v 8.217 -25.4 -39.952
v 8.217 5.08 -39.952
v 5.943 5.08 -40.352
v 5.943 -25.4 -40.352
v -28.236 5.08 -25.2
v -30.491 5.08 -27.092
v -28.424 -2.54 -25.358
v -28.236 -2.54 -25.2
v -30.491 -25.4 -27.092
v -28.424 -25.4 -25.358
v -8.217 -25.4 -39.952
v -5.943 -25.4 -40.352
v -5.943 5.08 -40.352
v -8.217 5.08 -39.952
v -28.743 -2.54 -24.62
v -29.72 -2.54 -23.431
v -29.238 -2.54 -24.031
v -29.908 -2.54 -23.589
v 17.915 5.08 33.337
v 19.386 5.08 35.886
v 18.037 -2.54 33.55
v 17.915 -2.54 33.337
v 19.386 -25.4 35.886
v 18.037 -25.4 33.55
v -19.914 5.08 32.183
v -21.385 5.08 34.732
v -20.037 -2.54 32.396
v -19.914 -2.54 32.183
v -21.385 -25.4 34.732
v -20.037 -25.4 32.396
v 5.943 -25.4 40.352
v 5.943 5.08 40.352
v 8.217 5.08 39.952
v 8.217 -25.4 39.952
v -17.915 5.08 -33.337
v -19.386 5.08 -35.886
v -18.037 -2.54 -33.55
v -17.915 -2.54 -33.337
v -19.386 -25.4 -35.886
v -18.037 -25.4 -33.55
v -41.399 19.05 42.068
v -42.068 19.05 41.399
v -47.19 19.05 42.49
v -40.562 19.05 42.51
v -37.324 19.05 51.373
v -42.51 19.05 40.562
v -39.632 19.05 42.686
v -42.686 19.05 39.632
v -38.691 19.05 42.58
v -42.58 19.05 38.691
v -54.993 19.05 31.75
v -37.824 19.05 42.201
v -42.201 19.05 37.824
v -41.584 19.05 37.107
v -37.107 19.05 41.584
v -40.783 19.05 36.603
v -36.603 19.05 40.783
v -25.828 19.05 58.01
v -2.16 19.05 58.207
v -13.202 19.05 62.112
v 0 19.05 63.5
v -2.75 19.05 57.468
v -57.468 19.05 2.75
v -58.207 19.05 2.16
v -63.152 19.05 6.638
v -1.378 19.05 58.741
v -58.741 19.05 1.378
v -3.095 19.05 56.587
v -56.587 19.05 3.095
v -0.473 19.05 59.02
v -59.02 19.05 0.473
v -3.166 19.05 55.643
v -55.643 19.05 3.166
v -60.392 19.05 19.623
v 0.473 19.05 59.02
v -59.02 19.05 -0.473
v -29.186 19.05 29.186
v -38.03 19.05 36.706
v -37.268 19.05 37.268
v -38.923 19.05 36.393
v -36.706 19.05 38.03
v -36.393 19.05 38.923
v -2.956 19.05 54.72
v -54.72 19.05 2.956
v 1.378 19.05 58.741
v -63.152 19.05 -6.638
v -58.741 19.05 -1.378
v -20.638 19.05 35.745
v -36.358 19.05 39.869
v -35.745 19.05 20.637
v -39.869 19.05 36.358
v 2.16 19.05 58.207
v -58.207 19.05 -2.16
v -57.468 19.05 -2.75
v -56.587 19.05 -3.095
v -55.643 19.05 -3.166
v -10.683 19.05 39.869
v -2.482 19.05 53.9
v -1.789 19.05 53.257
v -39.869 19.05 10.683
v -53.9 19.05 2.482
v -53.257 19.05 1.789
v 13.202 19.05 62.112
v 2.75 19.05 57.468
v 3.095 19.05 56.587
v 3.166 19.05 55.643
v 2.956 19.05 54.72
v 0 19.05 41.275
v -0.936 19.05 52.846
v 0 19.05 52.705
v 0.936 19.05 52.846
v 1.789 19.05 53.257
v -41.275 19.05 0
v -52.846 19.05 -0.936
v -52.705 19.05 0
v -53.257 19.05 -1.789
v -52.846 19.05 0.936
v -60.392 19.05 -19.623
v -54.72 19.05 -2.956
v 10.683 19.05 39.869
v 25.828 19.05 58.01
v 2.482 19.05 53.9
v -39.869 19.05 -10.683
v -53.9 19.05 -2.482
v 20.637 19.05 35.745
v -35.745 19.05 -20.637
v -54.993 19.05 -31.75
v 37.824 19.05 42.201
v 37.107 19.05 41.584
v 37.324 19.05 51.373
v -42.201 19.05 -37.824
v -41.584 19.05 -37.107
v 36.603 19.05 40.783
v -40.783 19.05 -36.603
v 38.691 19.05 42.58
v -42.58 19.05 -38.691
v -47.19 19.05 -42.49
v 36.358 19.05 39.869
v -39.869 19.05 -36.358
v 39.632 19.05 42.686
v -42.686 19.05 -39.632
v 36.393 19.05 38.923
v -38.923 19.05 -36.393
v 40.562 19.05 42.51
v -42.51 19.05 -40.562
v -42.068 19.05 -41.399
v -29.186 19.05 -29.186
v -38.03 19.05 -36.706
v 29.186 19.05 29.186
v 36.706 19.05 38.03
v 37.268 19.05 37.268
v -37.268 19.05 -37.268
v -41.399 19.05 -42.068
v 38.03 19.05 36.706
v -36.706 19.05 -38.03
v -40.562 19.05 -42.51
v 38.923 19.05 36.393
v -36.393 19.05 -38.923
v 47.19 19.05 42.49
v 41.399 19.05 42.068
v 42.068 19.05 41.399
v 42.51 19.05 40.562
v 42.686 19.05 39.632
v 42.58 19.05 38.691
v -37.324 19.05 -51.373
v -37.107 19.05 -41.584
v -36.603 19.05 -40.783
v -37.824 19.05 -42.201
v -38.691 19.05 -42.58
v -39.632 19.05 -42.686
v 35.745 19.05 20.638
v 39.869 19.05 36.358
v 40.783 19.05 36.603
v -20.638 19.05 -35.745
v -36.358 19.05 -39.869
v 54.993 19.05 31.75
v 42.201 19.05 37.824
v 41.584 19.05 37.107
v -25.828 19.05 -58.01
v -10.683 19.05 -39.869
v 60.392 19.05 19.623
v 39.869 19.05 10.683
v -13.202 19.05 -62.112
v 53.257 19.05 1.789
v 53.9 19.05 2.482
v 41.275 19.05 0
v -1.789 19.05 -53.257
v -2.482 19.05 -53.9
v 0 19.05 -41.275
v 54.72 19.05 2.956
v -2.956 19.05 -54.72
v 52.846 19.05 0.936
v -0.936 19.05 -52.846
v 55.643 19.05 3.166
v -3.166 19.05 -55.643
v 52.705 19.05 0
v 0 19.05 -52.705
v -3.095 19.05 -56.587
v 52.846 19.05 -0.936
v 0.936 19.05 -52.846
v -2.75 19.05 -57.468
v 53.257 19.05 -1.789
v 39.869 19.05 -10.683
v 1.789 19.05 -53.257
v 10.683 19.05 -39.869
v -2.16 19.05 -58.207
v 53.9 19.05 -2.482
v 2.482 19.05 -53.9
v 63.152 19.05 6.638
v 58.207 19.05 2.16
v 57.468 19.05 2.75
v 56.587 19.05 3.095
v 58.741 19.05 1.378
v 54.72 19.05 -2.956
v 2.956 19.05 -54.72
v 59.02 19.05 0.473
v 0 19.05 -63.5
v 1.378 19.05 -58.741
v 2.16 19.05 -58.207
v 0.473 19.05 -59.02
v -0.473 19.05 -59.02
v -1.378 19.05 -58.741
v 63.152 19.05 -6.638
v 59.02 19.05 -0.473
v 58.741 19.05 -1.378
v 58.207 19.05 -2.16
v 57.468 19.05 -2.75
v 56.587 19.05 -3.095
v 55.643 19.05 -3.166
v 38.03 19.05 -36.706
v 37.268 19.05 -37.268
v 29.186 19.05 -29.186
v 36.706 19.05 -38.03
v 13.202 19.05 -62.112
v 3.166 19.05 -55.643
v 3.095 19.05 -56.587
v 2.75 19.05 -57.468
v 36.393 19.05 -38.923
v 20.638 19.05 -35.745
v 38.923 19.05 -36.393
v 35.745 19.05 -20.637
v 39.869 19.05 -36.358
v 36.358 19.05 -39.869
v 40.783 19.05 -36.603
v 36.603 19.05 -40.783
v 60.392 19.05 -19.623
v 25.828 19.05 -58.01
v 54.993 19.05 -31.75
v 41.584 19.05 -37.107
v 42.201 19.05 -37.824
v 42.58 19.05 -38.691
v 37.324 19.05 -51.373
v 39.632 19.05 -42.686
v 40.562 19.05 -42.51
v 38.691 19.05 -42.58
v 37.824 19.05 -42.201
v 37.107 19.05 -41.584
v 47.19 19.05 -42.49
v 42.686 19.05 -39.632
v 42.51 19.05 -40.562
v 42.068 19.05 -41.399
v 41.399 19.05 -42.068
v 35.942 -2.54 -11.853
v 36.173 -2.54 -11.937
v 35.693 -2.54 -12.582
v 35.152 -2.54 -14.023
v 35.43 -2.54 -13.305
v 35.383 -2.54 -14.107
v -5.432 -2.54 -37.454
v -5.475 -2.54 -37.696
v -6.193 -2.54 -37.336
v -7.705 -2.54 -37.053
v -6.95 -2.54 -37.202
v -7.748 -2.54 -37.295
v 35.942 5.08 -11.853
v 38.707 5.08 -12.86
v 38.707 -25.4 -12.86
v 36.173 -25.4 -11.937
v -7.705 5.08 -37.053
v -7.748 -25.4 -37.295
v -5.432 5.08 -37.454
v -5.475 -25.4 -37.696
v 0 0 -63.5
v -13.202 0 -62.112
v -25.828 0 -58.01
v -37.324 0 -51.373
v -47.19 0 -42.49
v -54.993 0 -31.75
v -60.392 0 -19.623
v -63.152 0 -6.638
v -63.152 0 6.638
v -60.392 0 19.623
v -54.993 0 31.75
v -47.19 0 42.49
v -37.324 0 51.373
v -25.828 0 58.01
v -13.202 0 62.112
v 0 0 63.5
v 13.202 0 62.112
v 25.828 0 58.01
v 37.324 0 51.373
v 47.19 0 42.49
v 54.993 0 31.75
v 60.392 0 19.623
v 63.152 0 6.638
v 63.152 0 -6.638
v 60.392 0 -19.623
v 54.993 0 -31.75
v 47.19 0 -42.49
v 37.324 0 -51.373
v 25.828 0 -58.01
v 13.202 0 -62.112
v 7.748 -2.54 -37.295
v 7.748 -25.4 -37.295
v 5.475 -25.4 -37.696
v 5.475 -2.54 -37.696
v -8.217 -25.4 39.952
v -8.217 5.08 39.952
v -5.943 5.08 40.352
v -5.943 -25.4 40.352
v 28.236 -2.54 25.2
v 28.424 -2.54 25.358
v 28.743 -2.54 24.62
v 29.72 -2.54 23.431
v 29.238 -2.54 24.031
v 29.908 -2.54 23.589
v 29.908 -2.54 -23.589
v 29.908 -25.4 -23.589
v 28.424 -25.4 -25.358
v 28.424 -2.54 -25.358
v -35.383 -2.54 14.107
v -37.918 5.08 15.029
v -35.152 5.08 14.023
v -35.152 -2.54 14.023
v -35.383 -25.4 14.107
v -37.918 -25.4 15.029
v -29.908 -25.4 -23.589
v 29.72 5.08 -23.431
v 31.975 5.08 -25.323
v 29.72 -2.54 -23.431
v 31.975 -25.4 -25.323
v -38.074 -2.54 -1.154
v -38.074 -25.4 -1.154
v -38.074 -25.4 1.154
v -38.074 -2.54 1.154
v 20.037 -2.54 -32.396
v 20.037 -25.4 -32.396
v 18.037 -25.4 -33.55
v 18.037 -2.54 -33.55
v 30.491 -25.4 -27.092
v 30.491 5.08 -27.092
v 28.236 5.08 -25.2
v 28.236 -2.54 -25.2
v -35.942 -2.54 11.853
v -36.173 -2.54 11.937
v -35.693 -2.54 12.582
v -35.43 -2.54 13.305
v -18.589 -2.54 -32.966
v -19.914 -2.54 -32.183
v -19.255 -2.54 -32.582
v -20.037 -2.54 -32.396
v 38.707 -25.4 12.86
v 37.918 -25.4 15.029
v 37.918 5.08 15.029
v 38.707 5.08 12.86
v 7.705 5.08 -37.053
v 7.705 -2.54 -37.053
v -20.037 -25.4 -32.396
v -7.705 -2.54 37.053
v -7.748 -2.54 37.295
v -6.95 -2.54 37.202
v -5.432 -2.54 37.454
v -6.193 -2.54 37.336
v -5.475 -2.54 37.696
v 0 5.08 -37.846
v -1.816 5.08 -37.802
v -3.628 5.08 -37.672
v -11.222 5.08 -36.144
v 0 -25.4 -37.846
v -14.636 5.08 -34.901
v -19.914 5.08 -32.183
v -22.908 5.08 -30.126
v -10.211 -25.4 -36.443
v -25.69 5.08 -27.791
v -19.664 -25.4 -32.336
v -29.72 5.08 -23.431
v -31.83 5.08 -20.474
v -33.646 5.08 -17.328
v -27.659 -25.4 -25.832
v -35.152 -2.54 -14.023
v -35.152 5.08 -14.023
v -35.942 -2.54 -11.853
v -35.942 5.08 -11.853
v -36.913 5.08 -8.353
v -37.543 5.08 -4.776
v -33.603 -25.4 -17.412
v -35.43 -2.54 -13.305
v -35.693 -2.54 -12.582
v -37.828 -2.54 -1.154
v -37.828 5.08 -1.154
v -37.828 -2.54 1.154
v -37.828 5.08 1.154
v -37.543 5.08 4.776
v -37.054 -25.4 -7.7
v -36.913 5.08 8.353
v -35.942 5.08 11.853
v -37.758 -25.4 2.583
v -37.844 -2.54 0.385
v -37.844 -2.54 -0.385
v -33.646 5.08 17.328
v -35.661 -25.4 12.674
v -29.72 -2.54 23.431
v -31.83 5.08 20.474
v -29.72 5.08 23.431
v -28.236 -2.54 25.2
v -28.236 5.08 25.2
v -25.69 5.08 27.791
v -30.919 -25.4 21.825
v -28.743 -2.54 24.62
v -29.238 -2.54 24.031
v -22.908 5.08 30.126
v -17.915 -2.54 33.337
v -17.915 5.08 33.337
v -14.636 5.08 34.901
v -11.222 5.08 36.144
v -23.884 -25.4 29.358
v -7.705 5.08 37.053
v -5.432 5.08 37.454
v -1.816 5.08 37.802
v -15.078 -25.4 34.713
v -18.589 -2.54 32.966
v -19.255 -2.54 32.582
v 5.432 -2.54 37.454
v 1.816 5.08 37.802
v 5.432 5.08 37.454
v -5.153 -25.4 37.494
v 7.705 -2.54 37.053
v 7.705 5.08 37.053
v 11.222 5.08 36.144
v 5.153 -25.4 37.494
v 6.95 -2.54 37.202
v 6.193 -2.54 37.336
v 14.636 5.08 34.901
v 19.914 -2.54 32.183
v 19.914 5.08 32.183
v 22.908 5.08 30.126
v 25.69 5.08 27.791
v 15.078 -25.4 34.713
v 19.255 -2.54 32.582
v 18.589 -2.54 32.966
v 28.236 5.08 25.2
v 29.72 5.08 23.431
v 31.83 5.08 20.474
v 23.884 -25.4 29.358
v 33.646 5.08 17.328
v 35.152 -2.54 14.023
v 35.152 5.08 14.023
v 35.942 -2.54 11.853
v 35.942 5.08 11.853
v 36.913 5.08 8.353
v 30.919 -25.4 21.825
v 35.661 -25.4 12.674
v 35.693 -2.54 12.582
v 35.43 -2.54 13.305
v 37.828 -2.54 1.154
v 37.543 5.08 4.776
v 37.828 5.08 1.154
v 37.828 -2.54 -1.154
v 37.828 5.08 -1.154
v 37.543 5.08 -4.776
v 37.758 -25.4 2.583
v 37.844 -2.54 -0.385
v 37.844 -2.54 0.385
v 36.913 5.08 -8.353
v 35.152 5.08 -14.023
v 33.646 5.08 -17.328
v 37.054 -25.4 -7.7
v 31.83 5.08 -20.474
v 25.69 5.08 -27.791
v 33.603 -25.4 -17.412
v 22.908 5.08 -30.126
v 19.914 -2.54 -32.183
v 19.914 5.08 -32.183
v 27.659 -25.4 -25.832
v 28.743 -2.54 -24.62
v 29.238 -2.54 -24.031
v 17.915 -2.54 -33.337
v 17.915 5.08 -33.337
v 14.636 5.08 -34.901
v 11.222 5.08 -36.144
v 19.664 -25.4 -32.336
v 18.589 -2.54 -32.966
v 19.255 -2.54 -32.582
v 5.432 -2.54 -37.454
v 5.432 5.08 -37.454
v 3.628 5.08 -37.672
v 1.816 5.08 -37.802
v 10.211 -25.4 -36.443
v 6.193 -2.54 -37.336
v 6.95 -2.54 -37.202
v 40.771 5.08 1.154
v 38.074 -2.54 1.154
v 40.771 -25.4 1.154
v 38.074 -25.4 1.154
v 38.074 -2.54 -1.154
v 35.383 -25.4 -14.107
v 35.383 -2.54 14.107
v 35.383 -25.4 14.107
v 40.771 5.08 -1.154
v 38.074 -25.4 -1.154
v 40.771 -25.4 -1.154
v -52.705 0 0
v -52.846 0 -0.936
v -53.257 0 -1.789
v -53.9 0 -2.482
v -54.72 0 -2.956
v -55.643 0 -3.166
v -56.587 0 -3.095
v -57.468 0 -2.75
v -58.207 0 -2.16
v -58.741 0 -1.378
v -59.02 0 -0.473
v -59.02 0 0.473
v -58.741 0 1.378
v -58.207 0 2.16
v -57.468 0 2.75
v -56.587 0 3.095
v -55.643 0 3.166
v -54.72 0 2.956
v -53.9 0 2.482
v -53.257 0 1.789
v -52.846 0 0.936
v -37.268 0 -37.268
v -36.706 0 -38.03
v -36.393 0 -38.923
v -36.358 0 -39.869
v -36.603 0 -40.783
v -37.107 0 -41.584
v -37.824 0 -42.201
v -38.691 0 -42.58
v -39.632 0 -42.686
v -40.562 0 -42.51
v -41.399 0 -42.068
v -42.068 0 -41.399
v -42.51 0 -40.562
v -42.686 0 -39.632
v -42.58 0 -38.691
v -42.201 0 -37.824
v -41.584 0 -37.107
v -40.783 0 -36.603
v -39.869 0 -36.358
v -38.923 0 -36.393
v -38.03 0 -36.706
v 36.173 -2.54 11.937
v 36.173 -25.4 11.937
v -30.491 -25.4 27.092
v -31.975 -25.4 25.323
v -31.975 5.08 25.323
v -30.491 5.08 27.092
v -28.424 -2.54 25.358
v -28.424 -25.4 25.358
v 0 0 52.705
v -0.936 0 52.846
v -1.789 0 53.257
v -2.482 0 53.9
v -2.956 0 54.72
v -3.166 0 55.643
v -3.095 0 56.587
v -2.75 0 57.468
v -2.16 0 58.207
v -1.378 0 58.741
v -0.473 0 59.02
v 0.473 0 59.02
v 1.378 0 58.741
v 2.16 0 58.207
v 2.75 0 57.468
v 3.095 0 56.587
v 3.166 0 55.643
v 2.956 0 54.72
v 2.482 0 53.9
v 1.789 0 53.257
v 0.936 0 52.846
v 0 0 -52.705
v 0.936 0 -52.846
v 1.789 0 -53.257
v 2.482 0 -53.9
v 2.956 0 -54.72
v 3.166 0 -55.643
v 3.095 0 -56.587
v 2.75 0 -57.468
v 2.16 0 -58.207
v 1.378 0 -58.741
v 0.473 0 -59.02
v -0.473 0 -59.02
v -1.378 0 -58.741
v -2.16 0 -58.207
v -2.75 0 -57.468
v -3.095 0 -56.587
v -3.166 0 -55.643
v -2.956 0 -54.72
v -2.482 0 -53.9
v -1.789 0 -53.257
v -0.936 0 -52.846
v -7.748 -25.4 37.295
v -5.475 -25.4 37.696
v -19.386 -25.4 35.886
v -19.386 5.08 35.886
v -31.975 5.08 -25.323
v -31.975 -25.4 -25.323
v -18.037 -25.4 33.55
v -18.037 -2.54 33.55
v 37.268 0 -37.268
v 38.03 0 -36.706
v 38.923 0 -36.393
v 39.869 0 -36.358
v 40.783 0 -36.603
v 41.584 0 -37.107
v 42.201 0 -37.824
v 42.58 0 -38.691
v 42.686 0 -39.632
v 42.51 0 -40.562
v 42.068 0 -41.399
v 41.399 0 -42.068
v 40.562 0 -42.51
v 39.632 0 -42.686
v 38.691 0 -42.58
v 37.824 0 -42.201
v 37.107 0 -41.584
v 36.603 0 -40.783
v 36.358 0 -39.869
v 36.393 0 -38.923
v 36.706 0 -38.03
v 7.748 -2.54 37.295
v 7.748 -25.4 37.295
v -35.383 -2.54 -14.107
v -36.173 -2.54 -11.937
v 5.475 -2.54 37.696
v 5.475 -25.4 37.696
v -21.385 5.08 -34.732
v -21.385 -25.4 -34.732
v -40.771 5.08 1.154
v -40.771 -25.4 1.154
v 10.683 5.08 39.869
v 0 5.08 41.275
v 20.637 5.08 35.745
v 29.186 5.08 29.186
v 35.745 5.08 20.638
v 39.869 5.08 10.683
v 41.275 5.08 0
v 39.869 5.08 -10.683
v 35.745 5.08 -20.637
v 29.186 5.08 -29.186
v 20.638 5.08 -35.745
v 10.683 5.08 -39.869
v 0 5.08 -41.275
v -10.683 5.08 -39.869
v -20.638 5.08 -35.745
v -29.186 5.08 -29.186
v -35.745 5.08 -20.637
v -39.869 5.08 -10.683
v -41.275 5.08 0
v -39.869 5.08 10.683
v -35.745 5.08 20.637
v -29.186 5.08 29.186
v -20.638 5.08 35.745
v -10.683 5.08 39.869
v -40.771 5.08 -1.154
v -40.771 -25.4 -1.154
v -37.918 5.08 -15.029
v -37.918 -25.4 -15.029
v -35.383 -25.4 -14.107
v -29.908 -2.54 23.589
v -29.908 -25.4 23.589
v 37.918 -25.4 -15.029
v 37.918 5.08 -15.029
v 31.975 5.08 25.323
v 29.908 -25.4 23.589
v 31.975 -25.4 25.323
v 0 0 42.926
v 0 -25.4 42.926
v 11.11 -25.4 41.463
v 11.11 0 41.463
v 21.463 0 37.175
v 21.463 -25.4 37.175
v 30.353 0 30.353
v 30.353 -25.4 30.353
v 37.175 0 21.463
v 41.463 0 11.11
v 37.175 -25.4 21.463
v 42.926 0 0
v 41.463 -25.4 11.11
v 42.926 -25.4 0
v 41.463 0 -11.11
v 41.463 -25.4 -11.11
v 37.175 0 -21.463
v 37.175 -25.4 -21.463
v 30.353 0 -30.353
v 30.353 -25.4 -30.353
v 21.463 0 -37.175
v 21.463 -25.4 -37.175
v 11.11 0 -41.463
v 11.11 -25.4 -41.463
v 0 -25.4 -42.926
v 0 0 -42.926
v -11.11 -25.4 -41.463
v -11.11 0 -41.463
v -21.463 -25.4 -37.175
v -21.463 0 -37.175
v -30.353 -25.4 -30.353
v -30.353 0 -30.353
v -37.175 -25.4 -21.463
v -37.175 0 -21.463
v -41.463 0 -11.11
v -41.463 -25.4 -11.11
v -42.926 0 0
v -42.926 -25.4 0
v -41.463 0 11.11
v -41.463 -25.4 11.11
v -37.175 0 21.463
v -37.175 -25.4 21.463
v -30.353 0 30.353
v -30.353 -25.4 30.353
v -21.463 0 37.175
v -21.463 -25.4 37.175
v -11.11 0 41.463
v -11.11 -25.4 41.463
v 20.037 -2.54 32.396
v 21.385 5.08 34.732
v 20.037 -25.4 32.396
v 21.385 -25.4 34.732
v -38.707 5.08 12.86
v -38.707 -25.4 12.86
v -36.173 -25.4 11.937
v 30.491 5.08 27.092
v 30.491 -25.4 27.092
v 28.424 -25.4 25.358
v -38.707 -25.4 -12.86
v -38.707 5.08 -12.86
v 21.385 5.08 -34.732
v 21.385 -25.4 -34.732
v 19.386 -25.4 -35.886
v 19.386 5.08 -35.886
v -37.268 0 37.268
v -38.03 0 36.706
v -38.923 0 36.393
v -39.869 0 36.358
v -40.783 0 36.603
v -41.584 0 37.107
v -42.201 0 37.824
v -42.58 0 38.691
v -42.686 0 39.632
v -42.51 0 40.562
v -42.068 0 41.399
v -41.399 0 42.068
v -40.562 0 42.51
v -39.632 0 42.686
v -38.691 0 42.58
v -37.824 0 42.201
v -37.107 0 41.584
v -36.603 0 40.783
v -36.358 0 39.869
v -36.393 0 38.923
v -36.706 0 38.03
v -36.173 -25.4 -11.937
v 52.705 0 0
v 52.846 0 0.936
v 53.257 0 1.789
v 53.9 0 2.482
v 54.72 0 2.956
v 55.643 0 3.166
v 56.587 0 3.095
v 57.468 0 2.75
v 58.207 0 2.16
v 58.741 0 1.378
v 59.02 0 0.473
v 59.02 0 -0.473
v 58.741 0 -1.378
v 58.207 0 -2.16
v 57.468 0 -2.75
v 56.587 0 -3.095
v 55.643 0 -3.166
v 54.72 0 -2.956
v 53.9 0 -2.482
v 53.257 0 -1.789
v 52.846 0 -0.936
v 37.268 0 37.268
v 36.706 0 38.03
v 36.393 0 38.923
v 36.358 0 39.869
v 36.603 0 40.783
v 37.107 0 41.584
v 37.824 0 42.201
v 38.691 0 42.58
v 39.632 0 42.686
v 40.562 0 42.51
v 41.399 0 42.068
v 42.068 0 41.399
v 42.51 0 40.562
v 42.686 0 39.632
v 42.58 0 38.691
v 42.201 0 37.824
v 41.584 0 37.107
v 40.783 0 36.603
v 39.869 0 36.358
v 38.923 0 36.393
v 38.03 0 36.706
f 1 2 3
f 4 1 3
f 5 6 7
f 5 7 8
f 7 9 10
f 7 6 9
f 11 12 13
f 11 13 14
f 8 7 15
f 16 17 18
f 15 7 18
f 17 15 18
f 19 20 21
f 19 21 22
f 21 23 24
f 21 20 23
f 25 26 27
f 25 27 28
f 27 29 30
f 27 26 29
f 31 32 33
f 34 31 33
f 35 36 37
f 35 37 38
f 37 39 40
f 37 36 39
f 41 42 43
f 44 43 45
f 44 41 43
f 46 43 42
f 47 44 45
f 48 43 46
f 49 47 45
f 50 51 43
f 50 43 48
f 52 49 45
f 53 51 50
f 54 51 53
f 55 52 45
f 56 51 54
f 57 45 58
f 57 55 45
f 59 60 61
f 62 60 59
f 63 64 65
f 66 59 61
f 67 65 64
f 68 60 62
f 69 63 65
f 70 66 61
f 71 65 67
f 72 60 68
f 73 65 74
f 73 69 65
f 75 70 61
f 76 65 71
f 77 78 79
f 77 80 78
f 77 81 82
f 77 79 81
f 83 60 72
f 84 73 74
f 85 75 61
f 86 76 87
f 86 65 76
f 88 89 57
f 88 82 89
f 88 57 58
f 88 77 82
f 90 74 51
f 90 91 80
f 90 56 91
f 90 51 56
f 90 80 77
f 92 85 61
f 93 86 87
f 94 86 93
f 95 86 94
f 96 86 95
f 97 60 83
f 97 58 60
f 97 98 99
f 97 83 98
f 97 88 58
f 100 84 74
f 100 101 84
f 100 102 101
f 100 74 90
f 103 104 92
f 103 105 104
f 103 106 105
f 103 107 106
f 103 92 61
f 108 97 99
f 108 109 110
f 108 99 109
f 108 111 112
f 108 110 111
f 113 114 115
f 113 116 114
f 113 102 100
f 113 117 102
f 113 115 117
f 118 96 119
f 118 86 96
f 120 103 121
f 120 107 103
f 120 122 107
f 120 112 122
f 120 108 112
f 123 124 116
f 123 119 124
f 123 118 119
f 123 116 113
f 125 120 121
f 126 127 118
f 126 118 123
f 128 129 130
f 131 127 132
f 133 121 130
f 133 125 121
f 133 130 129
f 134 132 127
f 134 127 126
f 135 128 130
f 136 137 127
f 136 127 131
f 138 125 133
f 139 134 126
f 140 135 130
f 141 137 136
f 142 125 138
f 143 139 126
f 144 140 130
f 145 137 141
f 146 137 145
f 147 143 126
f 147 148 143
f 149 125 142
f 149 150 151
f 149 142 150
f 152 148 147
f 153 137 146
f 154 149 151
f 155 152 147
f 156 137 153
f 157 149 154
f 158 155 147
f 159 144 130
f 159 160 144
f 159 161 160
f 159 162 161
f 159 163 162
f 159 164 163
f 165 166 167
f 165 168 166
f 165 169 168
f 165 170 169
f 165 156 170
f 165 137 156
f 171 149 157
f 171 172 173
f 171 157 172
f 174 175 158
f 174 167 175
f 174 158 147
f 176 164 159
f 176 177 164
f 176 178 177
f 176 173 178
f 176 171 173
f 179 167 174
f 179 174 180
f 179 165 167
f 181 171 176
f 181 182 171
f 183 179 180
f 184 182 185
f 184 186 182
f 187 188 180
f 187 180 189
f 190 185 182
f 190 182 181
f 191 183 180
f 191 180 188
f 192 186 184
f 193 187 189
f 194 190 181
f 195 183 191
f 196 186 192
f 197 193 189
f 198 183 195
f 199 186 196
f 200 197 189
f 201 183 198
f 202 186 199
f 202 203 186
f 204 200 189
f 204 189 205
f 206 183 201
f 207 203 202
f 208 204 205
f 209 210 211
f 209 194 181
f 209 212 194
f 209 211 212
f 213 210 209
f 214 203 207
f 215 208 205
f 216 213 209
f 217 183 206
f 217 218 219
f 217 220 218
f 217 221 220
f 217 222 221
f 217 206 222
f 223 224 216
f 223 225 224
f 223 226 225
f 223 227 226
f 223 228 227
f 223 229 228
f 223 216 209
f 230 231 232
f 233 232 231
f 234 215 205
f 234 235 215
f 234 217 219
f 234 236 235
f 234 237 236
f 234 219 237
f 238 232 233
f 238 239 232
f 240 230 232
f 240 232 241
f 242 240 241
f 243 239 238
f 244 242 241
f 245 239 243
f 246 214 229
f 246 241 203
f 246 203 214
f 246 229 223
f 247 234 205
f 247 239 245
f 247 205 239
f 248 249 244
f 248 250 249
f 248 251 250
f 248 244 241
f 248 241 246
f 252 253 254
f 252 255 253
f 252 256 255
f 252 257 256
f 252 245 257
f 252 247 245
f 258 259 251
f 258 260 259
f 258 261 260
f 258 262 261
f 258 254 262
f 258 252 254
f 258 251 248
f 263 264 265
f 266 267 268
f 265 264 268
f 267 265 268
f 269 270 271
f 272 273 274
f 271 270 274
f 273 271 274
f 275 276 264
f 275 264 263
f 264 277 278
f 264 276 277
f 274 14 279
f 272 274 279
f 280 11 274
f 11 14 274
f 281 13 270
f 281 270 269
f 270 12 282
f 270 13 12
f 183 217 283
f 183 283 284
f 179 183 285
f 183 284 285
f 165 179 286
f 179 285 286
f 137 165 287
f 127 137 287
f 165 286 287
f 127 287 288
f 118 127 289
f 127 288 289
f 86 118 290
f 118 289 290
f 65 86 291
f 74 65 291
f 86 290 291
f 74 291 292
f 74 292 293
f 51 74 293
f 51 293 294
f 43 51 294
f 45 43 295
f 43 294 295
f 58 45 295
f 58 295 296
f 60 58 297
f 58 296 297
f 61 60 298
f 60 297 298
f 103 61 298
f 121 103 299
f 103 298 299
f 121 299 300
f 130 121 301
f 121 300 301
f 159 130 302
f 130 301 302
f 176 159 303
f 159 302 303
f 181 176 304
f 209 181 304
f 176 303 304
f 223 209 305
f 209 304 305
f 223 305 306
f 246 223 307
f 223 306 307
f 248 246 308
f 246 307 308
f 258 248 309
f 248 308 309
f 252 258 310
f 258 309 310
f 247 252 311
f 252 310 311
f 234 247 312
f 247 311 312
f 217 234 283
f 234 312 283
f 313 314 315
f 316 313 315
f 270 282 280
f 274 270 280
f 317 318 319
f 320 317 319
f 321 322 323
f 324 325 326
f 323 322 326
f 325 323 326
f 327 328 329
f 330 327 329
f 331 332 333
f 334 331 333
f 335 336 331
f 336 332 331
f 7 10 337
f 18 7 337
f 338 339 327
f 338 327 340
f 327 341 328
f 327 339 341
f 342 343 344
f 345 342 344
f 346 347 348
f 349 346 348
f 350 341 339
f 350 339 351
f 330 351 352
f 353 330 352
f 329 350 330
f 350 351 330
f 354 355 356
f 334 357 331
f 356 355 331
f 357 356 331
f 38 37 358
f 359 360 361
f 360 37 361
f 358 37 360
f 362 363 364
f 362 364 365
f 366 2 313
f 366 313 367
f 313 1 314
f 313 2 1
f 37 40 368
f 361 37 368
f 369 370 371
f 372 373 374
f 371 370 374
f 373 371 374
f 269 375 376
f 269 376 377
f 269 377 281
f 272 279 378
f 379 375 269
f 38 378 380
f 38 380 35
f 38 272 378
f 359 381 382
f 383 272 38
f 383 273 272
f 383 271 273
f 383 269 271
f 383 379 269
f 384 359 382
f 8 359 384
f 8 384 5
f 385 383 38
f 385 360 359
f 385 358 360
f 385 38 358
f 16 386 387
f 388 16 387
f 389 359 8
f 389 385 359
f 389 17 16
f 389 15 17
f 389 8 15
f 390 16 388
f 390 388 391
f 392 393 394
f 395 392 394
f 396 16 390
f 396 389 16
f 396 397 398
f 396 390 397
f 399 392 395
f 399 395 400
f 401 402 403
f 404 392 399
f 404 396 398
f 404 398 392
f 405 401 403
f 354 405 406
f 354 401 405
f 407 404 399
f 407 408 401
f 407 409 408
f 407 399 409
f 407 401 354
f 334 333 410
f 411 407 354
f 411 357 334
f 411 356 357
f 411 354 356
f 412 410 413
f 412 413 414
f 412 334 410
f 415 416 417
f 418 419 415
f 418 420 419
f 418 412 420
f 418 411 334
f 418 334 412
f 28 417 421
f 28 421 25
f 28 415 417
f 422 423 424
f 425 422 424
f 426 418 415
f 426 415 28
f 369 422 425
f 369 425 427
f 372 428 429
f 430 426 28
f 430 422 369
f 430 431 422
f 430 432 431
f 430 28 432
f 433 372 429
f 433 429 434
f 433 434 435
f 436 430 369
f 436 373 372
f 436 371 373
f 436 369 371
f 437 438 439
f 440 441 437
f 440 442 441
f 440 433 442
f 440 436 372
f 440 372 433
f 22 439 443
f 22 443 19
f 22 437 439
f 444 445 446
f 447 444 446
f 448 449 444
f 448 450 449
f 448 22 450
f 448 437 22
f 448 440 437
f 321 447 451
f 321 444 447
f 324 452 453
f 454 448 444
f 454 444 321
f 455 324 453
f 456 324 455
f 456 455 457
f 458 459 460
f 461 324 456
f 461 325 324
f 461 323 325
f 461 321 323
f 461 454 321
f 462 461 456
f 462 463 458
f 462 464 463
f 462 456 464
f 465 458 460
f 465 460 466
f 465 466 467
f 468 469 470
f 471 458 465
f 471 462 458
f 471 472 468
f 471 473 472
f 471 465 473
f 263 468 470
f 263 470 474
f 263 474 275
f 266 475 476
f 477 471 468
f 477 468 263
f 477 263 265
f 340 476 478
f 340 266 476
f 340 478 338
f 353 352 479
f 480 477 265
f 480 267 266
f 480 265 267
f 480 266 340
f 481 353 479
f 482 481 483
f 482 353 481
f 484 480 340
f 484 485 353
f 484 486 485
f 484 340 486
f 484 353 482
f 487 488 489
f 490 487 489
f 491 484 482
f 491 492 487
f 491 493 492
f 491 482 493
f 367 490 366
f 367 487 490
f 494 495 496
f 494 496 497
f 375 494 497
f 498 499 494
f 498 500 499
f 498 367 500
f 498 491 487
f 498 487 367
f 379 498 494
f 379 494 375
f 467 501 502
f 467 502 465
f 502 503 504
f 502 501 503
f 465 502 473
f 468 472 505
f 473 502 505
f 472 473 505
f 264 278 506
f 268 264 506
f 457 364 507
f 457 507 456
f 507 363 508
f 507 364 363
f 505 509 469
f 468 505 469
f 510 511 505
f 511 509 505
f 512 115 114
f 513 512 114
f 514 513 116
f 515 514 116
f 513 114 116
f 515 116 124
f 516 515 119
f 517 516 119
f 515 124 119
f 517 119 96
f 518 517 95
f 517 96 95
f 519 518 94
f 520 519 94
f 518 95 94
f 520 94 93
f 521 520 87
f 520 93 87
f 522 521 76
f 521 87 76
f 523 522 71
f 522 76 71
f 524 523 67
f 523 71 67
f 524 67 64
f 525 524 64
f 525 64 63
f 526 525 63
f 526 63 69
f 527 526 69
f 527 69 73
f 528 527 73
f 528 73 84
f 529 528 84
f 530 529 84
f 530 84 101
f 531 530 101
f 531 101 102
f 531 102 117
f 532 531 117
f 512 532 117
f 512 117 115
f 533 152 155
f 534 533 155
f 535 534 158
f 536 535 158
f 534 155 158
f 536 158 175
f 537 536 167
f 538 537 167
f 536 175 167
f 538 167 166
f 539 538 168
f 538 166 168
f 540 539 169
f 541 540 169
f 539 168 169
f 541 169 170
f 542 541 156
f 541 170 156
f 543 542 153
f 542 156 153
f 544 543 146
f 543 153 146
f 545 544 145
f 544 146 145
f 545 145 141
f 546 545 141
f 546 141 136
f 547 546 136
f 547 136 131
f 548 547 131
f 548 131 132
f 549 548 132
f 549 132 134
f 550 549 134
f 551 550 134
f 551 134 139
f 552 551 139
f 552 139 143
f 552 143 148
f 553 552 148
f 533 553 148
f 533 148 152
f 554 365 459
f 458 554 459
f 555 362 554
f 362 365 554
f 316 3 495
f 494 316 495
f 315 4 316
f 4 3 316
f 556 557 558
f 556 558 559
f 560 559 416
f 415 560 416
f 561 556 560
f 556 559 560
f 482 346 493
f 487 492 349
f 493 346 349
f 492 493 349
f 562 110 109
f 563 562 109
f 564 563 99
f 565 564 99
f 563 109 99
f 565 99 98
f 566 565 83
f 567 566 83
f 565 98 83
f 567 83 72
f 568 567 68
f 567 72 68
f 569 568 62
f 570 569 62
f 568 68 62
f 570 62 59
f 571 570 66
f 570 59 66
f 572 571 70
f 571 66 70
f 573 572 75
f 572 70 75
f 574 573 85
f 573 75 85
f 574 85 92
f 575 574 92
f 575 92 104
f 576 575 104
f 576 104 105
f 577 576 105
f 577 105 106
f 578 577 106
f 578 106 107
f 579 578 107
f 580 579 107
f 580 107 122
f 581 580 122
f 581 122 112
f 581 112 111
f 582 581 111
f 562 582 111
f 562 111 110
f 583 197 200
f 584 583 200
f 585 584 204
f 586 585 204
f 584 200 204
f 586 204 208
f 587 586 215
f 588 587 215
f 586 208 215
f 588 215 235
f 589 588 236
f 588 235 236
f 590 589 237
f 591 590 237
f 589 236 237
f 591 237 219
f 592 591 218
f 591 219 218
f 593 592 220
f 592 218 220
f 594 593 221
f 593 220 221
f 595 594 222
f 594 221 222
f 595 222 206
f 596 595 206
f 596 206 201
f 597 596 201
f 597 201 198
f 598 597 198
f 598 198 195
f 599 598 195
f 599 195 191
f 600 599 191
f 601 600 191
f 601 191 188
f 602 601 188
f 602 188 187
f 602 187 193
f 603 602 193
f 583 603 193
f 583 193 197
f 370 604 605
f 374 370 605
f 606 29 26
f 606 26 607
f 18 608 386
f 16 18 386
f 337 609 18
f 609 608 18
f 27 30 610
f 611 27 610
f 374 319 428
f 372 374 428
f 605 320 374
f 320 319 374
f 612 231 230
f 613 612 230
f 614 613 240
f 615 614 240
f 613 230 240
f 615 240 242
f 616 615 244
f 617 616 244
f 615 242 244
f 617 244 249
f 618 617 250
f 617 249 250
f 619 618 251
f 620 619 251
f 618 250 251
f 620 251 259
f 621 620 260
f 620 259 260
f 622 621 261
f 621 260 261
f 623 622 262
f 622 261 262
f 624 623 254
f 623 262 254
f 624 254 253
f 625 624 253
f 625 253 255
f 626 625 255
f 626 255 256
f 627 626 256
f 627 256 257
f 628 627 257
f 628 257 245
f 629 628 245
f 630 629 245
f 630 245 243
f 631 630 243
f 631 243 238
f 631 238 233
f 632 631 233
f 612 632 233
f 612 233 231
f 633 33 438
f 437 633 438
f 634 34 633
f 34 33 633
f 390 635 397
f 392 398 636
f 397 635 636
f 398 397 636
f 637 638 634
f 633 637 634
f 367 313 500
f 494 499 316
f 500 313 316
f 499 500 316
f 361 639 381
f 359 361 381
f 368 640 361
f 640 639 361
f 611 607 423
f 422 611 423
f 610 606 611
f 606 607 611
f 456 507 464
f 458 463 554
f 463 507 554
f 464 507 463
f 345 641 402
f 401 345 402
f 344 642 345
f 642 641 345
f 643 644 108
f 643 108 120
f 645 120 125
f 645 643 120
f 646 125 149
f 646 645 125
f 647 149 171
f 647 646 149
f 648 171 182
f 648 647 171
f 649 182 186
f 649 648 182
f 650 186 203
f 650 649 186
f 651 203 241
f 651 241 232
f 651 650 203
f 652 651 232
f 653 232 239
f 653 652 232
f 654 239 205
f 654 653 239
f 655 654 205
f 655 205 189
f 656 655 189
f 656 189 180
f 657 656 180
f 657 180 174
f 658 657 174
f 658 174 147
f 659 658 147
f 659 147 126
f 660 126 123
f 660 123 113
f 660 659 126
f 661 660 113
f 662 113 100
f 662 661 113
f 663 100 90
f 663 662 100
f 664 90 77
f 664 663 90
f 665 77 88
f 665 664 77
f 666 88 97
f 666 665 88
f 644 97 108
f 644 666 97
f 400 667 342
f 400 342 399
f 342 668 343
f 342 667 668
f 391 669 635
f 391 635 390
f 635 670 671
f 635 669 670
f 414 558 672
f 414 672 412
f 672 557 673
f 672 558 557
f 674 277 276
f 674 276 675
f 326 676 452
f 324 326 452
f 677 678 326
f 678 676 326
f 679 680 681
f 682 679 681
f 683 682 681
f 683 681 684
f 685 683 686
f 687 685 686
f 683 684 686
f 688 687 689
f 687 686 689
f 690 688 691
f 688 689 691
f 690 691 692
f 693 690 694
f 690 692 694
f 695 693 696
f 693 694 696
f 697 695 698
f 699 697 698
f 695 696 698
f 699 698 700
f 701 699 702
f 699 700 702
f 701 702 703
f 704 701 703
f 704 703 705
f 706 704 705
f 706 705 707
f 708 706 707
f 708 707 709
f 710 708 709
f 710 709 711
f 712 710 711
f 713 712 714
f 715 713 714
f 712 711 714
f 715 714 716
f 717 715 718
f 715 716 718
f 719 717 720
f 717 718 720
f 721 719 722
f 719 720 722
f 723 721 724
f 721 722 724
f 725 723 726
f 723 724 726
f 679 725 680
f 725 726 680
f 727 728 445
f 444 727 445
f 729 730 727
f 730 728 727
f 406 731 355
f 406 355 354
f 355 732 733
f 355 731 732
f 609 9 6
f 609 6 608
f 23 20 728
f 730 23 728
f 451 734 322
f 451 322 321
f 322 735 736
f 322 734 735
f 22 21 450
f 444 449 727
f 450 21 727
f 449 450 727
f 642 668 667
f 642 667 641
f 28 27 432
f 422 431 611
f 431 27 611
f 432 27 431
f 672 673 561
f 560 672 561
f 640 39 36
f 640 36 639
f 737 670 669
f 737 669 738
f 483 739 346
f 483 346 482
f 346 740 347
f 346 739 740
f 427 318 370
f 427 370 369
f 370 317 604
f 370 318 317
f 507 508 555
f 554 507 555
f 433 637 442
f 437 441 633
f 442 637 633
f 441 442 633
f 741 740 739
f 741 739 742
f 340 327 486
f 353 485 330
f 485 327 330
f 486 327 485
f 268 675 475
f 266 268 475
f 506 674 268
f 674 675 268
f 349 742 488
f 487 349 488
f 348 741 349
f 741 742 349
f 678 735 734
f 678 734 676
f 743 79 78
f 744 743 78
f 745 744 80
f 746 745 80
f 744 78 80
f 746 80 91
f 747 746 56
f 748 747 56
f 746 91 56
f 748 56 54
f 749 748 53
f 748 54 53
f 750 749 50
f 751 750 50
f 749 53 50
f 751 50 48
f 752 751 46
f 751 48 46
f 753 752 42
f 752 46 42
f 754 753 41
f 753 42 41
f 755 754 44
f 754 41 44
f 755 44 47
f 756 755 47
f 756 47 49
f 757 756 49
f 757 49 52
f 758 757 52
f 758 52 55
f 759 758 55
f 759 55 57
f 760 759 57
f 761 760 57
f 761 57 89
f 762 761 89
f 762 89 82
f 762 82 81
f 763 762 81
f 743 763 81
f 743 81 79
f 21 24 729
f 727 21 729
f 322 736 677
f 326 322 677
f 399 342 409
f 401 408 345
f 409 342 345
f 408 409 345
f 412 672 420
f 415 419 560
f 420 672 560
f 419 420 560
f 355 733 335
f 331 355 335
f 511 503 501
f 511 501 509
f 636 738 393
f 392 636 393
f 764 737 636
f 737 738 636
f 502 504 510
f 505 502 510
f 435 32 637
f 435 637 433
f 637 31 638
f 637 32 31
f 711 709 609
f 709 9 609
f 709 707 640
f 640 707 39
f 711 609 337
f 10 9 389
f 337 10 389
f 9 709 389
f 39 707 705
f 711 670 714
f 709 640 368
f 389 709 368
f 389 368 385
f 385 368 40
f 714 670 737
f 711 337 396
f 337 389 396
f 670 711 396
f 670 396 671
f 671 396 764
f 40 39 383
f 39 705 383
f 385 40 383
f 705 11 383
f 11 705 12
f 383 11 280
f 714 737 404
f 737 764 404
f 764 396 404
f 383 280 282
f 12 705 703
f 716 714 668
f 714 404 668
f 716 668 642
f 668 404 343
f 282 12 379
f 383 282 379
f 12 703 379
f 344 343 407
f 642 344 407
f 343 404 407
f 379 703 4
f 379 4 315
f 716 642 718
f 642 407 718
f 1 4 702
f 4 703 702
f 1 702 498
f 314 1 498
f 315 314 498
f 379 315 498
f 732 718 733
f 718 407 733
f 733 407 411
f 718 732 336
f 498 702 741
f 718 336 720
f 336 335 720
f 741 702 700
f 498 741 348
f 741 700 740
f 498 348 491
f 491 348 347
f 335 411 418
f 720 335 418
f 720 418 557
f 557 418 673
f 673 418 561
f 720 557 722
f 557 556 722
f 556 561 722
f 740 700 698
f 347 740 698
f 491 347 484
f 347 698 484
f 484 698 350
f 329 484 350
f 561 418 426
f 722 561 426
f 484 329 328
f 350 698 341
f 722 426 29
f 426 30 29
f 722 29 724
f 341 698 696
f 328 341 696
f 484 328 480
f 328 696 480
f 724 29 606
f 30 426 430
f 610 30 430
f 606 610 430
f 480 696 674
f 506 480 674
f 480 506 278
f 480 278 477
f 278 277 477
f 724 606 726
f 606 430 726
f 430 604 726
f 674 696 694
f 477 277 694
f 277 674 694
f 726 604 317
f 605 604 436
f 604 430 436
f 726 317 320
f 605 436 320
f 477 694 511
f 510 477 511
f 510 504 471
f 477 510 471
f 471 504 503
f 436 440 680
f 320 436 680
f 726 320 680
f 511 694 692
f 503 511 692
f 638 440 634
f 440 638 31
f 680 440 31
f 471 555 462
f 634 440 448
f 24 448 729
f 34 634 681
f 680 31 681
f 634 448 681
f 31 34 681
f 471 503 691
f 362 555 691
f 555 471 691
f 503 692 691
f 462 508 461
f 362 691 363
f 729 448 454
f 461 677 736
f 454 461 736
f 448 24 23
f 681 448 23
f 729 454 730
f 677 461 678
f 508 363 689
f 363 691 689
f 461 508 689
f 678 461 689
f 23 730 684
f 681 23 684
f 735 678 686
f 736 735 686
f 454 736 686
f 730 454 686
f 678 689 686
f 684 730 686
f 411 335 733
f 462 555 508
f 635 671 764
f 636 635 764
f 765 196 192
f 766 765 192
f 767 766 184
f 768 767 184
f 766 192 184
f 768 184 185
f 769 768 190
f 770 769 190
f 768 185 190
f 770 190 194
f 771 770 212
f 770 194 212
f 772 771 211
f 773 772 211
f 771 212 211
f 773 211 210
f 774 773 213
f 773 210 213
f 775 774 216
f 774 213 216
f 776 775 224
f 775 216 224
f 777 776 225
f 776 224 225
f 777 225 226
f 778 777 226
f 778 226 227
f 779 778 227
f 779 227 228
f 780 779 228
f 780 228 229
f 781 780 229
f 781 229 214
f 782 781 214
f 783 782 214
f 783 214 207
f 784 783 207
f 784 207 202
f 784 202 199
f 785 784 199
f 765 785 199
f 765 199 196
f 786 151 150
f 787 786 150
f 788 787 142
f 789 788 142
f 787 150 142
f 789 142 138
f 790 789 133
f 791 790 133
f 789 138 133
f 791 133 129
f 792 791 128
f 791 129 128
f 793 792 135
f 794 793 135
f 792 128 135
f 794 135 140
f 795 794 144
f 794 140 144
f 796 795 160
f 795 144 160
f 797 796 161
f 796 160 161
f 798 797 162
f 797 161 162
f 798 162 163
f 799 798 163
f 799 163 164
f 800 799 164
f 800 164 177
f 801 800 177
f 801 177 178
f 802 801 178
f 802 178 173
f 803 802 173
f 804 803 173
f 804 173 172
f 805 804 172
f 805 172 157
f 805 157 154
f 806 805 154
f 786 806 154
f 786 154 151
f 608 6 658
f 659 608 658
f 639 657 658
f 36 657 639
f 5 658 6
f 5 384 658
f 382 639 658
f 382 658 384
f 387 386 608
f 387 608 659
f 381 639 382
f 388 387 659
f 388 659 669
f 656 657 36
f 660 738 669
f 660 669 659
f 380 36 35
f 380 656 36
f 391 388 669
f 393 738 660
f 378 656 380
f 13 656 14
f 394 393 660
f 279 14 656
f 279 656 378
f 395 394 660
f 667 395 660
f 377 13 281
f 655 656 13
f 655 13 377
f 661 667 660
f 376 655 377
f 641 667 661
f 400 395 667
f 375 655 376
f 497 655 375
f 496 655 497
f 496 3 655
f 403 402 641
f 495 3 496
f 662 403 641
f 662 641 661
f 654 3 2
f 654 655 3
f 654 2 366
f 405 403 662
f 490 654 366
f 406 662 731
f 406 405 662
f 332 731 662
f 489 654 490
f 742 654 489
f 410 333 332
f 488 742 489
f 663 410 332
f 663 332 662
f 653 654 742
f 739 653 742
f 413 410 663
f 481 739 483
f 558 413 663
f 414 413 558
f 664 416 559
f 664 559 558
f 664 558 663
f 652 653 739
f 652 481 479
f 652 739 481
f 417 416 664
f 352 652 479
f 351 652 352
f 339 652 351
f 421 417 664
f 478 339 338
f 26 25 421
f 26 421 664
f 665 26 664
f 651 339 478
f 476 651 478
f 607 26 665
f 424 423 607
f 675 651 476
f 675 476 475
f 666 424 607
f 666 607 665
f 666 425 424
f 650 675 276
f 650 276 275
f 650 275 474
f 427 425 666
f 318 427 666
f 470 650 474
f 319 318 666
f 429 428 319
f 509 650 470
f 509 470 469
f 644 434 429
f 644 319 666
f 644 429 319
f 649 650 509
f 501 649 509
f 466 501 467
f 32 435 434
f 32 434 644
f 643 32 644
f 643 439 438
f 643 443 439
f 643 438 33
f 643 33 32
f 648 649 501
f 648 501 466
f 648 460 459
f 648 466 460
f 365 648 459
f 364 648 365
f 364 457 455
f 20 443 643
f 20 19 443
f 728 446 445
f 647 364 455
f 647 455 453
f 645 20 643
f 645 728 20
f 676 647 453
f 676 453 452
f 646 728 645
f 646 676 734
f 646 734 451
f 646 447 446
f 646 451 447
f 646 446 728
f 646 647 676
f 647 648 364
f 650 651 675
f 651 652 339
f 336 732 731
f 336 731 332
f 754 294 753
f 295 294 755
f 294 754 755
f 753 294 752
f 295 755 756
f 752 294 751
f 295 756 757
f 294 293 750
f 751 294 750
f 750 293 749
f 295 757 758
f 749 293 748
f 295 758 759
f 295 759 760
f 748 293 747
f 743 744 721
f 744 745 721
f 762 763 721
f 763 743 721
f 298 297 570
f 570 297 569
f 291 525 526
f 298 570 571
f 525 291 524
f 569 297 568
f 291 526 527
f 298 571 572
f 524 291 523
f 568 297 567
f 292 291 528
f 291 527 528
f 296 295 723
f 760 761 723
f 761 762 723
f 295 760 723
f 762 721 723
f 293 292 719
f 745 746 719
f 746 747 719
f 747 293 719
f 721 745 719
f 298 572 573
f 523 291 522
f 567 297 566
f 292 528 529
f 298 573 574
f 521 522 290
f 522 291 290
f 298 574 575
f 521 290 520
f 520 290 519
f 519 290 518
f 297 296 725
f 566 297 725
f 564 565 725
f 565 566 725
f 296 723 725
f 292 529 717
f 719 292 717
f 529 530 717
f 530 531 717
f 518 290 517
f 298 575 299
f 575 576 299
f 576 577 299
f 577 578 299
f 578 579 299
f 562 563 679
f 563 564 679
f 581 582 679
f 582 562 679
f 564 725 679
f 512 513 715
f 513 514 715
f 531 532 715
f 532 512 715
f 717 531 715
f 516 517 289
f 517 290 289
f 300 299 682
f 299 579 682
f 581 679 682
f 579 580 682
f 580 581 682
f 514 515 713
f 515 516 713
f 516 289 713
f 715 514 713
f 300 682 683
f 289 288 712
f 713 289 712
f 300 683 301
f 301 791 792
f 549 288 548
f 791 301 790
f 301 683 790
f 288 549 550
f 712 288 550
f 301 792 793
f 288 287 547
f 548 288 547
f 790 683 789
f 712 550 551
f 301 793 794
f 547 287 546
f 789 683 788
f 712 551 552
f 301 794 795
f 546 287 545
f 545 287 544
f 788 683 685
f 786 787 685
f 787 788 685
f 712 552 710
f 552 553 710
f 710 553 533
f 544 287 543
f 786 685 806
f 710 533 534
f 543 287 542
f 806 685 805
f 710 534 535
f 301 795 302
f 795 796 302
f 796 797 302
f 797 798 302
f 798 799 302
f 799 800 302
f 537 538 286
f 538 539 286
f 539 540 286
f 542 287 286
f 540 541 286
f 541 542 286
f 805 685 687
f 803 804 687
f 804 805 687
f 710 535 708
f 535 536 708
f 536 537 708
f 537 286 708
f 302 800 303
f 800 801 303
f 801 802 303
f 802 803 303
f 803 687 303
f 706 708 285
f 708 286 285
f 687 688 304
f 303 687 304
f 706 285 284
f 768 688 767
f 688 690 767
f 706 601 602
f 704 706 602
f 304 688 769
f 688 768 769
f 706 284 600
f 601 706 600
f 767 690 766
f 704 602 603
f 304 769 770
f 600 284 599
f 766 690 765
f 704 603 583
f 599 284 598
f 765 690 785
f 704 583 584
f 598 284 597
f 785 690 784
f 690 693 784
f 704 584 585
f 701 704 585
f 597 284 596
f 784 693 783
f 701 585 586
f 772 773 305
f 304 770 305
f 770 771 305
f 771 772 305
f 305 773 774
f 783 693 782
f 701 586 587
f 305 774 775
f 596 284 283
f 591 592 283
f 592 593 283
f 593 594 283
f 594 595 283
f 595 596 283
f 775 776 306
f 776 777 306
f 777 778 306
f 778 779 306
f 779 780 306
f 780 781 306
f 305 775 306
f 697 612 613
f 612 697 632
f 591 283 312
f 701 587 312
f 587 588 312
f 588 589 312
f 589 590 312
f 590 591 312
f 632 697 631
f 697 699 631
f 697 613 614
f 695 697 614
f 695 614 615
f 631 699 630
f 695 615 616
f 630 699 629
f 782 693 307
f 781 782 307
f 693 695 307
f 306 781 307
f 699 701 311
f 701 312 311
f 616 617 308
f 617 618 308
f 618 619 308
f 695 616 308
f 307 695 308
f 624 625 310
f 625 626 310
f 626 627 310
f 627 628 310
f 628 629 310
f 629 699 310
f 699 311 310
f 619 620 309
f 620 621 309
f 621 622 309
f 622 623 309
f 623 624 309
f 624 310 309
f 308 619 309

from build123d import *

# Parameters (mm, degrees)
SKETCH1_R           = 63.5
SKETCH1_R_2         = 37.846
BOSS_EXTRUDE1_DEPTH = 19.05
SKETCH2_R           = 3.175
CUT_EXTRUDE1_DEPTH  = 92.800885072
CIRPATTERN1_COUNT   = 8
BOSS_EXTRUDE2_START = -25.4
SKETCH1_3_R         = 42.926
SKETCH1_3_R_2       = 37.846
BOSS_EXTRUDE2_DEPTH = 25.4
CUT_EXTRUDE2_START  = -13.97
SKETCH3_R           = 41.275
SKETCH3_R_2         = 37.846
CUT_EXTRUDE2_DEPTH  = 13.97
SKETCH4_W           = 2.697449546
SKETCH4_H           = 2.30839954
CUT_EXTRUDE3_DEPTH  = 101.201309872
SKETCH5_W           = 2.30839954
SKETCH5_H           = 7.62
CUT_EXTRUDE4_DEPTH  = 2.54
CIRPATTERN2_COUNT   = 18


with BuildPart() as part:
    # Sketch1 → Boss-Extrude1 (new body)
    with BuildSketch(Plane(origin=(0, 0, 0), x_dir=(1, 0, 0), z_dir=(0, 1, 0))):
        Circle(SKETCH1_R)
        Circle(SKETCH1_R_2, mode=Mode.SUBTRACT)
    extrude(amount=BOSS_EXTRUDE1_DEPTH)

    # Sketch2 → Cut-Extrude1 (cut, through all)
    with BuildSketch(Plane(origin=(0, 19.05, 0), x_dir=(1, 0, 0), z_dir=(0, 1, 0))):
        with Locations((0, 55.88)):
            Circle(SKETCH2_R)
    cut_extrude1 = extrude(amount=-CUT_EXTRUDE1_DEPTH, mode=Mode.SUBTRACT)

    # CirPattern1: Cut-Extrude1 ×8 about axis
    cirpattern1_axis = Axis((0, 19.05, 0), (0, -1, 0))
    for i in range(1, CIRPATTERN1_COUNT):
        add(cut_extrude1.rotate(cirpattern1_axis, i * 360 / CIRPATTERN1_COUNT), mode=Mode.SUBTRACT)

    # Sketch1<3> → Boss-Extrude2 (add)
    with BuildSketch(Plane(origin=(0, 0, 0), x_dir=(1, 0, 0), z_dir=(0, 1, 0)).offset(BOSS_EXTRUDE2_START)):
        Circle(SKETCH1_3_R)
        Circle(SKETCH1_3_R_2, mode=Mode.SUBTRACT)
    extrude(amount=BOSS_EXTRUDE2_DEPTH)

    # Sketch3 → Cut-Extrude2 (cut)
    with BuildSketch(Plane(origin=(0, 19.05, 0), x_dir=(1, 0, 0), z_dir=(0, 1, 0)).offset(CUT_EXTRUDE2_START)):
        Circle(SKETCH3_R)
        Circle(SKETCH3_R_2, mode=Mode.SUBTRACT)
    extrude(amount=CUT_EXTRUDE2_DEPTH, mode=Mode.SUBTRACT)

    # Sketch4 → Cut-Extrude3 (cut, through all)
    with BuildSketch(Plane.XZ.offset(25.4)):
        with Locations((-39.422702208, 0)):
            Rectangle(SKETCH4_W, SKETCH4_H)
    cut_extrude3 = extrude(amount=-CUT_EXTRUDE3_DEPTH, mode=Mode.SUBTRACT)

    # Sketch5 → Cut-Extrude4 (cut)
    with BuildSketch(Plane.ZY.offset(38.073977435)):
        with Locations((0, 1.27)):
            Rectangle(SKETCH5_W, SKETCH5_H)
    cut_extrude4 = extrude(amount=-CUT_EXTRUDE4_DEPTH, mode=Mode.SUBTRACT)

    # CirPattern2: Cut-Extrude3, Cut-Extrude4 ×18 about axis
    cirpattern2_axis = Axis((0, 19.05, 0), (0, -1, 0))
    add([cut_extrude3.rotate(cirpattern2_axis, i * 360 / CIRPATTERN2_COUNT) for i in range(1, CIRPATTERN2_COUNT)], mode=Mode.SUBTRACT)
    add([cut_extrude4.rotate(cirpattern2_axis, i * 360 / CIRPATTERN2_COUNT) for i in range(1, CIRPATTERN2_COUNT)], mode=Mode.SUBTRACT)


solid = part.part
